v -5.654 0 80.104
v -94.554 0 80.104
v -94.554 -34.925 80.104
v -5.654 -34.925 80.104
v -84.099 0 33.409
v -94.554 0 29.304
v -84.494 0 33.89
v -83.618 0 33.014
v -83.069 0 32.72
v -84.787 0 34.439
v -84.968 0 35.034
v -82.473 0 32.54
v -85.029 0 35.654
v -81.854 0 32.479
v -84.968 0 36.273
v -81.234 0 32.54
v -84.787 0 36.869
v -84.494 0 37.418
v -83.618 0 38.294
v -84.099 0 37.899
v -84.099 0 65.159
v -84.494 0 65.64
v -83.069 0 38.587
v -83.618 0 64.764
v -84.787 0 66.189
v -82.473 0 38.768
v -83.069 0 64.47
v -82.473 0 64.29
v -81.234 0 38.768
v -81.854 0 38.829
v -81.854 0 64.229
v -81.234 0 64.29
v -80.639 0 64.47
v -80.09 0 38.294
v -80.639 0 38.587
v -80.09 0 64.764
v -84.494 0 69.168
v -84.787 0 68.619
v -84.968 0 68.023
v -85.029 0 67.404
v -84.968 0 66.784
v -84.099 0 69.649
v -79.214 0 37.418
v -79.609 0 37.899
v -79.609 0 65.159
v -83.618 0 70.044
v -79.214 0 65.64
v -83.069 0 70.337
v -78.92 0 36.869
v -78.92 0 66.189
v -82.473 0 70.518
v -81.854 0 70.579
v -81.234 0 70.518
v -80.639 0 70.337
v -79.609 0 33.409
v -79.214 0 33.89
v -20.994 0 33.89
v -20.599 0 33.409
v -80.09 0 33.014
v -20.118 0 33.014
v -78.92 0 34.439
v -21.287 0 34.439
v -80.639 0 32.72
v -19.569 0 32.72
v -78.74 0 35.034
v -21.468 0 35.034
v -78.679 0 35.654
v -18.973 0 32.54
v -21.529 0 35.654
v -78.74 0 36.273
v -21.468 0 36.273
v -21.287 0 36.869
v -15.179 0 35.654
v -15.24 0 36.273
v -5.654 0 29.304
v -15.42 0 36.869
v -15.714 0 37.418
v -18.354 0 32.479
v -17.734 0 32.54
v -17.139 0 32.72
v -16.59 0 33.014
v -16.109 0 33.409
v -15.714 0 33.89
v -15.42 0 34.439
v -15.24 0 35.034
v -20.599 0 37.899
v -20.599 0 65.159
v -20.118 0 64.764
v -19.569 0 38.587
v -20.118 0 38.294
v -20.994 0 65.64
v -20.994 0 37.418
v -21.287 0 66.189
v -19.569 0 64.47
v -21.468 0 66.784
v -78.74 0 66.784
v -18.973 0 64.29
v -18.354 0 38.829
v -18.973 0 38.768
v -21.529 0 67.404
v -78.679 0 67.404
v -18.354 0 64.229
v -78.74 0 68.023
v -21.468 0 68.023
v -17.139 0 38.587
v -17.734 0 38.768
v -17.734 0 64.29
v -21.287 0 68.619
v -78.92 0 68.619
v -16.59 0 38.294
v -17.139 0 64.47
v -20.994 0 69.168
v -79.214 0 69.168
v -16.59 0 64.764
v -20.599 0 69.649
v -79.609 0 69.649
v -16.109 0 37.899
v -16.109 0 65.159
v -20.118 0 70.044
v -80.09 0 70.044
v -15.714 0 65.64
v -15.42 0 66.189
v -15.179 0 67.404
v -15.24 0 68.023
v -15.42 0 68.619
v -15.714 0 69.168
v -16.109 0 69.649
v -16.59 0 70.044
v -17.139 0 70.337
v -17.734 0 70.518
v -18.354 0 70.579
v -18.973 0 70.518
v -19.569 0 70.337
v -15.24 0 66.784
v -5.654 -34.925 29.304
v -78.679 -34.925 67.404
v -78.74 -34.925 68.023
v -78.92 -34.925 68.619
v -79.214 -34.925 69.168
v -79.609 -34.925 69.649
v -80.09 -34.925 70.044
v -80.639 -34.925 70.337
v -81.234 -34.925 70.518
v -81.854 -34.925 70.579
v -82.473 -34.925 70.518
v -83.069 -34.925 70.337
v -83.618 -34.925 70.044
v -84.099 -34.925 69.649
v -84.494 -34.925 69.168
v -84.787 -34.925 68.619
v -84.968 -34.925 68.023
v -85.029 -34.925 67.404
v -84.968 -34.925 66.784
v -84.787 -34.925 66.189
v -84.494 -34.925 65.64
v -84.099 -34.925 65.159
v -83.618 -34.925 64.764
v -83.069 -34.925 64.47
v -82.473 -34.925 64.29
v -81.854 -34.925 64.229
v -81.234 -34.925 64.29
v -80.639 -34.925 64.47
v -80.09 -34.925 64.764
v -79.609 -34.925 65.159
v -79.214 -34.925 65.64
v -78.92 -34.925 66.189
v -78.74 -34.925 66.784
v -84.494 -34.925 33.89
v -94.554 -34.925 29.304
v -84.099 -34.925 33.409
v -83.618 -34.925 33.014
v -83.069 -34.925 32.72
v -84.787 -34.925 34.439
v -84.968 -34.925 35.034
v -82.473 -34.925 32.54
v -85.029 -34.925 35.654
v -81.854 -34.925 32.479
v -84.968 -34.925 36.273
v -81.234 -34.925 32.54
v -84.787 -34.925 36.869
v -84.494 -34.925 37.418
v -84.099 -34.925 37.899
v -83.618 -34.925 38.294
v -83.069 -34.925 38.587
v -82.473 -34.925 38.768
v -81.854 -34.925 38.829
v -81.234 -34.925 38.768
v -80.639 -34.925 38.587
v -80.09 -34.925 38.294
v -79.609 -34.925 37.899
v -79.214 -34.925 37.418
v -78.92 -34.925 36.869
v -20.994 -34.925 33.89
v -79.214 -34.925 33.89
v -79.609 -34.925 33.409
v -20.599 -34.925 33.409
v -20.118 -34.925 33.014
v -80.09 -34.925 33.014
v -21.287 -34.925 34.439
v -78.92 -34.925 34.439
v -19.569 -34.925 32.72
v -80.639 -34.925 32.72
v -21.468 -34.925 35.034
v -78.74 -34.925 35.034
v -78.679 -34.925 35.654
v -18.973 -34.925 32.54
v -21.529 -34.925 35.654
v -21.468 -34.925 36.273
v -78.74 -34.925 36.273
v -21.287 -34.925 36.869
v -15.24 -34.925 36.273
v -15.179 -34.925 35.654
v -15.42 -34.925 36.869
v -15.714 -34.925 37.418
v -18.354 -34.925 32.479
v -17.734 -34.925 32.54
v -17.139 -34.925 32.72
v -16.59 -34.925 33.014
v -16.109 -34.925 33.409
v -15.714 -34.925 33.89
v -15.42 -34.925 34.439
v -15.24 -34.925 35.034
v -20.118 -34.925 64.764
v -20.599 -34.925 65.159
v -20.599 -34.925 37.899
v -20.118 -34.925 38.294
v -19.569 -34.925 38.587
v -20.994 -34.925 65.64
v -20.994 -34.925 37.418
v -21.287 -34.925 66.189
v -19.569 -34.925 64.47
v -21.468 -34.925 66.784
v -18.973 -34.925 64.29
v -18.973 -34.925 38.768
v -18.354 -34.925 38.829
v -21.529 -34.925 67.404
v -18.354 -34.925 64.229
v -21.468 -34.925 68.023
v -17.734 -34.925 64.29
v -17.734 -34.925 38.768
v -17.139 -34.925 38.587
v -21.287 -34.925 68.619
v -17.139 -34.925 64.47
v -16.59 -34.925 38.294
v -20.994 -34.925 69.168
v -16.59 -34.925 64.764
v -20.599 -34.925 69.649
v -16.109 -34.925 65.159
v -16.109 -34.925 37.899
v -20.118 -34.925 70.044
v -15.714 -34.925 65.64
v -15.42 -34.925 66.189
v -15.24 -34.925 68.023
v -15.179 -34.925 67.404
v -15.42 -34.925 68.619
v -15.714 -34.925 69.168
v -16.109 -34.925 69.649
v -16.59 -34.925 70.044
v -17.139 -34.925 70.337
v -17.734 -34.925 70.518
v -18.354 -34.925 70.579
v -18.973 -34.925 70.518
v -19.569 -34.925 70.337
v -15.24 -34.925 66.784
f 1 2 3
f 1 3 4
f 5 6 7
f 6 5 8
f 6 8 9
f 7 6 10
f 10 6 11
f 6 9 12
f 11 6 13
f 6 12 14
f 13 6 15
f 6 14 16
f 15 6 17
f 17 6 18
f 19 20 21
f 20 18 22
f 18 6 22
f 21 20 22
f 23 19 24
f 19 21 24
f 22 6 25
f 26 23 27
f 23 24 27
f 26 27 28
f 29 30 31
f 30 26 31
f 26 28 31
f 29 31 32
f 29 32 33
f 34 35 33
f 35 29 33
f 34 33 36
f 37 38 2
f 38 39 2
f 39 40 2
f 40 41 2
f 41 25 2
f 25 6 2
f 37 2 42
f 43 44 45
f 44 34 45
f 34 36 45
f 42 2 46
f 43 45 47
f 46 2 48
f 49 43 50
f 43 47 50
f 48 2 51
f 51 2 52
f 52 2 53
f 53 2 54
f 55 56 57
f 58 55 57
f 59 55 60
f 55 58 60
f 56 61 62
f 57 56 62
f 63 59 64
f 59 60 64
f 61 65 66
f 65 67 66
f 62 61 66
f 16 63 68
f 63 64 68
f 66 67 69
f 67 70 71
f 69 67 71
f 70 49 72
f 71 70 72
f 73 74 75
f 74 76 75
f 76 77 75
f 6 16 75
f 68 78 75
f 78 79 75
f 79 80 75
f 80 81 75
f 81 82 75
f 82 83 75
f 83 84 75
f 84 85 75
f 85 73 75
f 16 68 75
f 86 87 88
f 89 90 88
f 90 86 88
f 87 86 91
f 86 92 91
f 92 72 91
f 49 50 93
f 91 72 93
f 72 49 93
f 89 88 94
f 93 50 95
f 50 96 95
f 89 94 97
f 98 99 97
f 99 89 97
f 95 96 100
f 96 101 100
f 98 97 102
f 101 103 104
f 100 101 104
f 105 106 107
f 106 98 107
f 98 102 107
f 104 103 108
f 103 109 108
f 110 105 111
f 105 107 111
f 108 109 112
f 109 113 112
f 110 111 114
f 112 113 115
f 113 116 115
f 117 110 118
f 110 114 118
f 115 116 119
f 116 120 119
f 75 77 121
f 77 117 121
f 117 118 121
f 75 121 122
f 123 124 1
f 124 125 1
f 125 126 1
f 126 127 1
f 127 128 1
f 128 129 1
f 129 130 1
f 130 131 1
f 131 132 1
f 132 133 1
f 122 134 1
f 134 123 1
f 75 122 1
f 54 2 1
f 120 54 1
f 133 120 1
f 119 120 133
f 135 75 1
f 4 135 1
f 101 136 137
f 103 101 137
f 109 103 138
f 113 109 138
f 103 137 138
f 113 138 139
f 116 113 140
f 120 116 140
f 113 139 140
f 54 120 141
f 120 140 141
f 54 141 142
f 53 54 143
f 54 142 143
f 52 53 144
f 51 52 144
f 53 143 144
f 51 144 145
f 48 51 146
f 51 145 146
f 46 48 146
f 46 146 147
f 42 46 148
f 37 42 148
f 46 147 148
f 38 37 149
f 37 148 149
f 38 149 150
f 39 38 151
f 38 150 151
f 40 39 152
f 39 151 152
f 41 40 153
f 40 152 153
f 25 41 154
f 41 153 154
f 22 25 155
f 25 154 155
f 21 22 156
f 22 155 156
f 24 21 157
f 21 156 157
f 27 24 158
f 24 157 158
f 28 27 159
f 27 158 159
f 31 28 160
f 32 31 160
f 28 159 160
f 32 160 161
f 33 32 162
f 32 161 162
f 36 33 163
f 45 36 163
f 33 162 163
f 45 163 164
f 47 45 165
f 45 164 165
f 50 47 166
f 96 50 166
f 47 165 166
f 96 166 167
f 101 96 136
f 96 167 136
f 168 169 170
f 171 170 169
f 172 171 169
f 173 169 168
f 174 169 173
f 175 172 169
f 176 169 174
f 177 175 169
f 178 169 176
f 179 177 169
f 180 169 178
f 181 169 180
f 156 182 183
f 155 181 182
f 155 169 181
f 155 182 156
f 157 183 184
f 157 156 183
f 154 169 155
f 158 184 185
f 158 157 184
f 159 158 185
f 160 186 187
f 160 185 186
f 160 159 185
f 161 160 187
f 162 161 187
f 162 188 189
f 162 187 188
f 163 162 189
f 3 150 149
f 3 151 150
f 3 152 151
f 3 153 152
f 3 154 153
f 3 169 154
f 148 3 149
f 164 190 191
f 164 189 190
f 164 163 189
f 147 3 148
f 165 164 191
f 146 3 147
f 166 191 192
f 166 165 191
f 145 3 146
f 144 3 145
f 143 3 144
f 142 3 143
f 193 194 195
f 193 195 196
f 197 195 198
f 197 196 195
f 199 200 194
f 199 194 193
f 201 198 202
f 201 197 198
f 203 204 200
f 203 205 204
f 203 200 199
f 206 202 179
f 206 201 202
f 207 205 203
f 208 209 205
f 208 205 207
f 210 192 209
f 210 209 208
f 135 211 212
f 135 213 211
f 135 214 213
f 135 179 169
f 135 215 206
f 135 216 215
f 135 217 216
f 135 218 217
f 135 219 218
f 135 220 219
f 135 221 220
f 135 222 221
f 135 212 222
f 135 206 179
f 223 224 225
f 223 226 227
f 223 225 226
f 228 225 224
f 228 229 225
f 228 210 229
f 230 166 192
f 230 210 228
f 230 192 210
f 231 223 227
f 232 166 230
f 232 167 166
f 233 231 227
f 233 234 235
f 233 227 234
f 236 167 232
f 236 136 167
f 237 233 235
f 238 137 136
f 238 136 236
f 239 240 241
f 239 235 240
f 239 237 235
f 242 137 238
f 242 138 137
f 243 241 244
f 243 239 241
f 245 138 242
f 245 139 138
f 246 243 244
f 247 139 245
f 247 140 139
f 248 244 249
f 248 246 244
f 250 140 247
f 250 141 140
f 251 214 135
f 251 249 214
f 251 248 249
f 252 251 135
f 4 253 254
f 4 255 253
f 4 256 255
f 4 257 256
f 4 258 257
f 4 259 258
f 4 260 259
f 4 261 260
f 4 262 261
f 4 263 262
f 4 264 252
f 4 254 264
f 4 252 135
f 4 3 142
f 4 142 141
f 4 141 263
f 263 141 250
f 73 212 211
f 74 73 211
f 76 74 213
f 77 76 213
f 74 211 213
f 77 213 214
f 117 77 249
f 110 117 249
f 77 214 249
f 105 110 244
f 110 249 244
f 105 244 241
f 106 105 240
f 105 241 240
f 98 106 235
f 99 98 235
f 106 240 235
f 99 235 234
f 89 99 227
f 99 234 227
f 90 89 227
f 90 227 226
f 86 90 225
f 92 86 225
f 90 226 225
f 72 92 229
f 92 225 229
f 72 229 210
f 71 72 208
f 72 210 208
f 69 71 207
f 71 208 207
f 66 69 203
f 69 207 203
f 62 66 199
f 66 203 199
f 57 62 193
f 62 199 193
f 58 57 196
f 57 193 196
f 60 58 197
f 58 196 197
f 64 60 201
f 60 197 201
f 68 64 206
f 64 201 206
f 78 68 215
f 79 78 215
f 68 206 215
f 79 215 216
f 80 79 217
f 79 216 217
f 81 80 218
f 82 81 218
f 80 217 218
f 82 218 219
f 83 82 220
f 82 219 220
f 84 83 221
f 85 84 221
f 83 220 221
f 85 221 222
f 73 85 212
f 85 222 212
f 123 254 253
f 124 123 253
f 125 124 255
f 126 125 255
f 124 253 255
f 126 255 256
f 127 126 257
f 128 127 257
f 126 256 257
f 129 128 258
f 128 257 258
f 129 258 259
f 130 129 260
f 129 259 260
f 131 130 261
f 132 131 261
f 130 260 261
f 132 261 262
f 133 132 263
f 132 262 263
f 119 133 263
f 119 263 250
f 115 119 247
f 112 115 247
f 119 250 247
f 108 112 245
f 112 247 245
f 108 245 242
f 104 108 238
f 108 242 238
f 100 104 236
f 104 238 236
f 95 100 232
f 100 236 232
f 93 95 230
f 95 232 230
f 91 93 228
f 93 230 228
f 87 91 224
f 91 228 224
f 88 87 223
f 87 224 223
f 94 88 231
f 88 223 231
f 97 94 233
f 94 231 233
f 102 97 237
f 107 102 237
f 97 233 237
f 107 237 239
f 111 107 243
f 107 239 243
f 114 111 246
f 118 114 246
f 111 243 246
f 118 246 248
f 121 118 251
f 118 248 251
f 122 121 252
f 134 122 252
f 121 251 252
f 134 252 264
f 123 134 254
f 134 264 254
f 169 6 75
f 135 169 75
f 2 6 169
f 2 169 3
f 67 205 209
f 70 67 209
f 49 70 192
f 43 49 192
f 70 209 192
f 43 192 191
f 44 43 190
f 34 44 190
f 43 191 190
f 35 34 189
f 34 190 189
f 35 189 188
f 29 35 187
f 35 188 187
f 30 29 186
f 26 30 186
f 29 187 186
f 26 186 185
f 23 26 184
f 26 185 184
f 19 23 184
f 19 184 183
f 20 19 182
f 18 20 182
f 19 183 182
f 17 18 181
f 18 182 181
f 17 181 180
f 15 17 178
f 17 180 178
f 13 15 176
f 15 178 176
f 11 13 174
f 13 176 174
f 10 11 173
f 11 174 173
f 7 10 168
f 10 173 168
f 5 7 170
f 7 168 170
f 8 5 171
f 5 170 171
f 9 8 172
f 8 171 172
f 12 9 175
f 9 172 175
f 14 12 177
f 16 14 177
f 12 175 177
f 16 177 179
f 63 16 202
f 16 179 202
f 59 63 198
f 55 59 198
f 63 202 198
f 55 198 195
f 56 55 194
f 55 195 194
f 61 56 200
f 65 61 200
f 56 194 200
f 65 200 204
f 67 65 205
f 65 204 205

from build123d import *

# Parameters (mm, degrees)
F0_W     = 88.9
F0_H     = 50.8
F1_DEPTH = 34.925
F2_R     = 3.175
F3_DEPTH = 34.925


with BuildPart() as f1:
    # F0 (on Front) → F1 (new body)
    with BuildSketch(Plane.XZ):
        with Locations((-50.103806, 54.703811)):
            Rectangle(F0_W, F0_H)
    extrude(amount=F1_DEPTH)

    # F2 (on face) → F3 (cut)
    with BuildSketch(Plane.XZ.offset(34.925)):
        with Locations((-81.853806, 67.403811)):
            Circle(F2_R)
        with Locations((-81.853806, 35.653811)):
            Circle(F2_R)
        with Locations((-18.353806, 67.403811)):
            Circle(F2_R)
        with Locations((-18.353806, 35.653811)):
            Circle(F2_R)
    extrude(amount=-F3_DEPTH, mode=Mode.SUBTRACT)


solid = f1.part
